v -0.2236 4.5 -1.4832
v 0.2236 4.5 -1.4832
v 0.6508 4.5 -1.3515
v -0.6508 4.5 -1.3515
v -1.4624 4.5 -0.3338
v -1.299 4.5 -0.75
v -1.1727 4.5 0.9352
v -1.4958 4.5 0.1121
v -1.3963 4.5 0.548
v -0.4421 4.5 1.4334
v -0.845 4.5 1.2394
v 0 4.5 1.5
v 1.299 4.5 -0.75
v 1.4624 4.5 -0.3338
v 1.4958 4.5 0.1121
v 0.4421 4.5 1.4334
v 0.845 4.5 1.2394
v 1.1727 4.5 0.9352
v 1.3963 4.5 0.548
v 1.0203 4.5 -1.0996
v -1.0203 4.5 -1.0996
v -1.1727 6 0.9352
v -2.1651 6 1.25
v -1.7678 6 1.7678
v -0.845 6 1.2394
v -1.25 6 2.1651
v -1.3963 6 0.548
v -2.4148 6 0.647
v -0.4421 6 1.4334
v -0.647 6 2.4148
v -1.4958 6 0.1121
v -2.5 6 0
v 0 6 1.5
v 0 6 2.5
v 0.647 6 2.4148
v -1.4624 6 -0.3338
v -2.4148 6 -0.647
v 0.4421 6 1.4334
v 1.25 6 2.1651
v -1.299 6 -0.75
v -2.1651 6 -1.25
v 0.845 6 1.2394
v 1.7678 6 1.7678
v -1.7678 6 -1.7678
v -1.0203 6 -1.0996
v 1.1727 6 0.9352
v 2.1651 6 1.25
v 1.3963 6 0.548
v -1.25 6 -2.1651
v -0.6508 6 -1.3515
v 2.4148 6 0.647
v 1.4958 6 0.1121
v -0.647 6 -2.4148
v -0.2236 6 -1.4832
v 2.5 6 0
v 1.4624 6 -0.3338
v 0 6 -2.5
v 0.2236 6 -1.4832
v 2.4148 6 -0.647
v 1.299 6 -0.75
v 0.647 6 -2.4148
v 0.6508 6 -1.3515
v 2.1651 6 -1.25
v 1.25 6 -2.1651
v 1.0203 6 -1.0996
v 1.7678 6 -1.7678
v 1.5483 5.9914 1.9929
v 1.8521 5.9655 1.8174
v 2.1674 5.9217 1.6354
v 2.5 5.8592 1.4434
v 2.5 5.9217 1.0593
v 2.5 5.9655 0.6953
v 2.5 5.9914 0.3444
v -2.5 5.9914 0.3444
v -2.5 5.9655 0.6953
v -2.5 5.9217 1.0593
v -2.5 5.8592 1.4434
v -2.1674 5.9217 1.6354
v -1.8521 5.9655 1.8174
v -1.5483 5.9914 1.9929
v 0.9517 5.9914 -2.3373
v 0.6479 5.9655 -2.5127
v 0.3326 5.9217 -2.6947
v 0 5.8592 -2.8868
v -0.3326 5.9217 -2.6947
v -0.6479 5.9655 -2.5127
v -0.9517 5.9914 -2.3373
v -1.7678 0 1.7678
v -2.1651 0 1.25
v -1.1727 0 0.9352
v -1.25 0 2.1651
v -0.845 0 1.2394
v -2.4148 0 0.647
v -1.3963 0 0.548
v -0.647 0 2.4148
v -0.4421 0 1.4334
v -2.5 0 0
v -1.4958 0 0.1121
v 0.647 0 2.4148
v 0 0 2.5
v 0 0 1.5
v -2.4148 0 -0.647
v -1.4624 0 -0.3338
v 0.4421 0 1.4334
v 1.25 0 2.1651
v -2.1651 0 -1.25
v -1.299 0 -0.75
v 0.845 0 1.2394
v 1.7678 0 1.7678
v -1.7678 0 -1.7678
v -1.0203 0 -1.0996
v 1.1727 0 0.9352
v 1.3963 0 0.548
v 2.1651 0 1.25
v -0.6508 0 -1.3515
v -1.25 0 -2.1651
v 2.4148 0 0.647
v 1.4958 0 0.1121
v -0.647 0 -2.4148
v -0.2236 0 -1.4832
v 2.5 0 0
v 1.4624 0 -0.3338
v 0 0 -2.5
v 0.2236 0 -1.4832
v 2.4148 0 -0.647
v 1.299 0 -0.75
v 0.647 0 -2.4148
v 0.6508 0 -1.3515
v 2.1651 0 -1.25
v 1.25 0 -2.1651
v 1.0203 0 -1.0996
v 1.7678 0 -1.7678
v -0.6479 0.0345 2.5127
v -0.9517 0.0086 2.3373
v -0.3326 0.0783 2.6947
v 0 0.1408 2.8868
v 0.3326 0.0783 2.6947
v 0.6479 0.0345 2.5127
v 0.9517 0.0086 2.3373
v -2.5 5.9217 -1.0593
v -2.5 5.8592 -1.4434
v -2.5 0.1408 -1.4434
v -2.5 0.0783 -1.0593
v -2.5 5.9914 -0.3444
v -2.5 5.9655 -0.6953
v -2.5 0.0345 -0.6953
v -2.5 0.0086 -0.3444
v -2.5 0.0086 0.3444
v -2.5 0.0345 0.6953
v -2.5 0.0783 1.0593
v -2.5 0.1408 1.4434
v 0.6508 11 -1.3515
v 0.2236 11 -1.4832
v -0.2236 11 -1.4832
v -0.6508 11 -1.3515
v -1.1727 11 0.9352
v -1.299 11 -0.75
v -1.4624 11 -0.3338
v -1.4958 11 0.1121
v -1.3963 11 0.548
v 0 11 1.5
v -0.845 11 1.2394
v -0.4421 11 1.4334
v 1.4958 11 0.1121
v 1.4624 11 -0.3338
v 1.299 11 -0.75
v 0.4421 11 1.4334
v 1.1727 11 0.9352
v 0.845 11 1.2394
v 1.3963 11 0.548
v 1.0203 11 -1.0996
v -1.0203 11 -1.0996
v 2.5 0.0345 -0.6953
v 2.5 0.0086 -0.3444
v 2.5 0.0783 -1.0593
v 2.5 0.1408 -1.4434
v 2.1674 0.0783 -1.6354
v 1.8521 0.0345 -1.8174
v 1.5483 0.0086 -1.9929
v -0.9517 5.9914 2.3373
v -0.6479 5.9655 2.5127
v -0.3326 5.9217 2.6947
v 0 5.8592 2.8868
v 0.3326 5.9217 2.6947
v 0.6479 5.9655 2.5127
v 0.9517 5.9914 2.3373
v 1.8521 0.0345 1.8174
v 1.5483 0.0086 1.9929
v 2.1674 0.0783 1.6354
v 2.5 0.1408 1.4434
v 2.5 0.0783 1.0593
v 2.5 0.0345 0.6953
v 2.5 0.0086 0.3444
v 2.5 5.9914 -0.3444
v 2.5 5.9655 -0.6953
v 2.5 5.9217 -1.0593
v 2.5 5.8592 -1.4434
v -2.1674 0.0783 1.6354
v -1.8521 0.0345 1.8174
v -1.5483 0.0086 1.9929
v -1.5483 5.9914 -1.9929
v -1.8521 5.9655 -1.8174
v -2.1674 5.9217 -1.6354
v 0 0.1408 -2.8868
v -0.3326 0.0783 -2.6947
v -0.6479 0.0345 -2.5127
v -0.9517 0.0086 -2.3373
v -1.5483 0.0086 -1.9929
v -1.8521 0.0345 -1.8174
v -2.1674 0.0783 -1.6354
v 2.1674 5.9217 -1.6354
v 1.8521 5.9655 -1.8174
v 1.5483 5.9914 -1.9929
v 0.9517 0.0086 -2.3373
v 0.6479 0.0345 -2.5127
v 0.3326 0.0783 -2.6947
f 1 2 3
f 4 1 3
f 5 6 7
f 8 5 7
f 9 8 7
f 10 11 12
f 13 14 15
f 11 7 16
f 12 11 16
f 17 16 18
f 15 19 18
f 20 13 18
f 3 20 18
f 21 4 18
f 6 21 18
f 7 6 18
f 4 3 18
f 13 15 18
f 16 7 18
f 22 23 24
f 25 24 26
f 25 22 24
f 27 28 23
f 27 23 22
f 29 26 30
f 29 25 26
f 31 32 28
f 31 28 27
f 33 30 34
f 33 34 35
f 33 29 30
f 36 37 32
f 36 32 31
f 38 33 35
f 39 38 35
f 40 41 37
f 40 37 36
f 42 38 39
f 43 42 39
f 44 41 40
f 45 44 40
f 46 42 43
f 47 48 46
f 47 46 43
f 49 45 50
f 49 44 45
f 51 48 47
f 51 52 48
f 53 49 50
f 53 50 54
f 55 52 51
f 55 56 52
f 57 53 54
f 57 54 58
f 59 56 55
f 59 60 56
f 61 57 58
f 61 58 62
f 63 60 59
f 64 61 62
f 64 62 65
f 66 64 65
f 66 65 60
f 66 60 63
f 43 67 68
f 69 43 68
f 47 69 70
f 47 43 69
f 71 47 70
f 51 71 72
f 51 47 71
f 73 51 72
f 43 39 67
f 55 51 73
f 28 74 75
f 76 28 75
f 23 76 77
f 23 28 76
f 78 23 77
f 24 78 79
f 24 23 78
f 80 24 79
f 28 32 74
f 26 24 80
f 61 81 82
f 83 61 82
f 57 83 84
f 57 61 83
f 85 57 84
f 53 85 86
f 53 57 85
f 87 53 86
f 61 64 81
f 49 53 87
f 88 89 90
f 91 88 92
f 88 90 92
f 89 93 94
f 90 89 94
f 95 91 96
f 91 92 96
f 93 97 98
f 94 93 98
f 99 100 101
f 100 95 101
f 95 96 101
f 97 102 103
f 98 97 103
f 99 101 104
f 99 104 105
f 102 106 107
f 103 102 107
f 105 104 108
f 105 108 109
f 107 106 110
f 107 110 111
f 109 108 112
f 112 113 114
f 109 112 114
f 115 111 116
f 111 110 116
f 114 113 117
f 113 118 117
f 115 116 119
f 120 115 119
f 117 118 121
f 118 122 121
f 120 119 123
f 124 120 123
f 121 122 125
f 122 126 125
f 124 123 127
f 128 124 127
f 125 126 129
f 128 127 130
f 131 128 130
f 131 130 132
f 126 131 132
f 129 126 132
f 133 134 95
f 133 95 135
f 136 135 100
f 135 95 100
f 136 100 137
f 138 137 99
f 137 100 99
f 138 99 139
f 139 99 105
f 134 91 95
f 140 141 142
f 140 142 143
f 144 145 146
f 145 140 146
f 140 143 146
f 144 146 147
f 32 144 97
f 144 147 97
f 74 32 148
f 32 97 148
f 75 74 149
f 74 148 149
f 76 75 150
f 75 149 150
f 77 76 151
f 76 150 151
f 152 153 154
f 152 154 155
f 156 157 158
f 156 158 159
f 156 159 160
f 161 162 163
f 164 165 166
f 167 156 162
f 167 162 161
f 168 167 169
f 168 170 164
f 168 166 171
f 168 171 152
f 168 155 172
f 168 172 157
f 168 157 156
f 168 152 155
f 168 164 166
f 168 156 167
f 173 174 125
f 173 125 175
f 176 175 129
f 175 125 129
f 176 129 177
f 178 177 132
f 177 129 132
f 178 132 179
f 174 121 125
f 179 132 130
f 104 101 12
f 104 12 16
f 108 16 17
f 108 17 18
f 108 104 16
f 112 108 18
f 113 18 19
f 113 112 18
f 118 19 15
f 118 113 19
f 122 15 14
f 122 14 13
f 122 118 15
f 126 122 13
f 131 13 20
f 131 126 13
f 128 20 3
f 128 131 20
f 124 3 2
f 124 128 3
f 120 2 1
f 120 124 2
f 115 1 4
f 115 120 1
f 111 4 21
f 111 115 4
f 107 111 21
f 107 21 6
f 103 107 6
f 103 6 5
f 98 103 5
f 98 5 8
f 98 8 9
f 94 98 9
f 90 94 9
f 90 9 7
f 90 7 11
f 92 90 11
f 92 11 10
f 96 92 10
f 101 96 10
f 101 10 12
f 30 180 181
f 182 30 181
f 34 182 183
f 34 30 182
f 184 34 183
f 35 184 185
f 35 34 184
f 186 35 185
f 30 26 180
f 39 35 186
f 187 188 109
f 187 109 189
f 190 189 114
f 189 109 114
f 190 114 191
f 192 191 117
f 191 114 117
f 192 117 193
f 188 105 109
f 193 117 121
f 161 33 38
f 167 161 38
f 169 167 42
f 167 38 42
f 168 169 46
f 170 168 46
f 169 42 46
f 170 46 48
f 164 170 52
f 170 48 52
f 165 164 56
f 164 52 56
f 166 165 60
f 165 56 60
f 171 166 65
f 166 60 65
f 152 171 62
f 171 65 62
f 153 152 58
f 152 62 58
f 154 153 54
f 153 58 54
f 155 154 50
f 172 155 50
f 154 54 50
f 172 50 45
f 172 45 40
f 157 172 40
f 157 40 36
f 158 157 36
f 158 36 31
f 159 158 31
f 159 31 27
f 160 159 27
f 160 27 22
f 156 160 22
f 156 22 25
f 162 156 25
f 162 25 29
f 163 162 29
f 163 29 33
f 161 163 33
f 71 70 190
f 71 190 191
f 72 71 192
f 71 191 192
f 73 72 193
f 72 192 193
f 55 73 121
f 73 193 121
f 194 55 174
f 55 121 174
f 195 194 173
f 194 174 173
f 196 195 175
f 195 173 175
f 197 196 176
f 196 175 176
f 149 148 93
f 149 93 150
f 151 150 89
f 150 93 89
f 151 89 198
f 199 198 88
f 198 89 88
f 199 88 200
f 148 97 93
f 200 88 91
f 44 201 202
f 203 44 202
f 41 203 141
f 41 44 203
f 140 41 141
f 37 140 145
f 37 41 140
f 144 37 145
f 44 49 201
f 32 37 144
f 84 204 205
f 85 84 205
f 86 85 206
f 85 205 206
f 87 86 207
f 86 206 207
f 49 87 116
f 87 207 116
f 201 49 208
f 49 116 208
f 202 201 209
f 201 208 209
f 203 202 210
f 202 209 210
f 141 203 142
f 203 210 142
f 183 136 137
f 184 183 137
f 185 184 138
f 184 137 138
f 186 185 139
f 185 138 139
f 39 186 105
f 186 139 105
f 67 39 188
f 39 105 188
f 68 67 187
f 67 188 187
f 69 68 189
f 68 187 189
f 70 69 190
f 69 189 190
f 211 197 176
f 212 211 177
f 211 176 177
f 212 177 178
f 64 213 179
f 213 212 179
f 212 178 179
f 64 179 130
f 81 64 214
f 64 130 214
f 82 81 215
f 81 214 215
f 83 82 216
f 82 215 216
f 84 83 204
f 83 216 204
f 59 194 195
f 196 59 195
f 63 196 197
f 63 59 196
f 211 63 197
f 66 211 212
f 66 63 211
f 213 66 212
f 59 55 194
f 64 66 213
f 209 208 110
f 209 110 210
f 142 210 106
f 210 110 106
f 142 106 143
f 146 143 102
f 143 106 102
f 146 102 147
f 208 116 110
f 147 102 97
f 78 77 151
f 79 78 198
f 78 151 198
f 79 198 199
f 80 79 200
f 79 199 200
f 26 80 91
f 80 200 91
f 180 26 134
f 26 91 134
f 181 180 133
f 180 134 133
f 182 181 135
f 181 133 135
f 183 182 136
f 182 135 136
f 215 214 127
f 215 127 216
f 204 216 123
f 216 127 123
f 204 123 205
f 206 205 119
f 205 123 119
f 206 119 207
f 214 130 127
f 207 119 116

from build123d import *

# Parameters (mm, degrees)
SKETCH1_R                = 1.5
BOSS_EXTRUDE1_DEPTH      = 6
BOSS_EXTRUDE2_DEPTH      = 5
BOSS_EXTRUDE2_DEPTH_BACK = 1.5
SKETCH7_R                = 1.5


with BuildPart() as part:
    # Sketch1 → Boss-Extrude1 (new body)
    with BuildSketch(Plane(origin=(0, 0, 0), x_dir=(1, 0, 0), z_dir=(0, 1, 0))):
        Polygon((0, 2.886751346), (-2.5, 1.443375673), (-2.5, -1.443375673), (0, -2.886751346), (2.5, -1.443375673), (2.5, 1.443375673), align=None)
        with Locations(Location((0, 0, 0), (0, 0, 270))):
            Circle(SKETCH1_R, mode=Mode.SUBTRACT)
    extrude(amount=BOSS_EXTRUDE1_DEPTH)

    # Sketch6 → Cut-Revolve1 (revolve, cut)
    with BuildSketch(Plane.ZY):
        Polygon((2.5, 6), (2.886751346, 6), (2.886751346, 5.859234022), align=None)
    cut_revolve1 = revolve(axis=Axis((0, 6, 0), (0, 1, 0)), mode=Mode.SUBTRACT)

    # Mirror1: Cut-Revolve1 across plane
    add(cut_revolve1.mirror(Plane.ZX.offset(3)), mode=Mode.SUBTRACT)

    # Sketch7 → Boss-Extrude2 (add, two sides: drawn at the far end of the back side and taken through both)
    with BuildSketch(Plane(origin=(0, 6, 0), x_dir=(1, 0, 0), z_dir=(0, 1, 0)).offset(-BOSS_EXTRUDE2_DEPTH_BACK)):
        with Locations(Location((0, 0, 0), (0, 0, 270))):
            Circle(SKETCH7_R)
    extrude(amount=BOSS_EXTRUDE2_DEPTH + BOSS_EXTRUDE2_DEPTH_BACK)


solid = part.part
